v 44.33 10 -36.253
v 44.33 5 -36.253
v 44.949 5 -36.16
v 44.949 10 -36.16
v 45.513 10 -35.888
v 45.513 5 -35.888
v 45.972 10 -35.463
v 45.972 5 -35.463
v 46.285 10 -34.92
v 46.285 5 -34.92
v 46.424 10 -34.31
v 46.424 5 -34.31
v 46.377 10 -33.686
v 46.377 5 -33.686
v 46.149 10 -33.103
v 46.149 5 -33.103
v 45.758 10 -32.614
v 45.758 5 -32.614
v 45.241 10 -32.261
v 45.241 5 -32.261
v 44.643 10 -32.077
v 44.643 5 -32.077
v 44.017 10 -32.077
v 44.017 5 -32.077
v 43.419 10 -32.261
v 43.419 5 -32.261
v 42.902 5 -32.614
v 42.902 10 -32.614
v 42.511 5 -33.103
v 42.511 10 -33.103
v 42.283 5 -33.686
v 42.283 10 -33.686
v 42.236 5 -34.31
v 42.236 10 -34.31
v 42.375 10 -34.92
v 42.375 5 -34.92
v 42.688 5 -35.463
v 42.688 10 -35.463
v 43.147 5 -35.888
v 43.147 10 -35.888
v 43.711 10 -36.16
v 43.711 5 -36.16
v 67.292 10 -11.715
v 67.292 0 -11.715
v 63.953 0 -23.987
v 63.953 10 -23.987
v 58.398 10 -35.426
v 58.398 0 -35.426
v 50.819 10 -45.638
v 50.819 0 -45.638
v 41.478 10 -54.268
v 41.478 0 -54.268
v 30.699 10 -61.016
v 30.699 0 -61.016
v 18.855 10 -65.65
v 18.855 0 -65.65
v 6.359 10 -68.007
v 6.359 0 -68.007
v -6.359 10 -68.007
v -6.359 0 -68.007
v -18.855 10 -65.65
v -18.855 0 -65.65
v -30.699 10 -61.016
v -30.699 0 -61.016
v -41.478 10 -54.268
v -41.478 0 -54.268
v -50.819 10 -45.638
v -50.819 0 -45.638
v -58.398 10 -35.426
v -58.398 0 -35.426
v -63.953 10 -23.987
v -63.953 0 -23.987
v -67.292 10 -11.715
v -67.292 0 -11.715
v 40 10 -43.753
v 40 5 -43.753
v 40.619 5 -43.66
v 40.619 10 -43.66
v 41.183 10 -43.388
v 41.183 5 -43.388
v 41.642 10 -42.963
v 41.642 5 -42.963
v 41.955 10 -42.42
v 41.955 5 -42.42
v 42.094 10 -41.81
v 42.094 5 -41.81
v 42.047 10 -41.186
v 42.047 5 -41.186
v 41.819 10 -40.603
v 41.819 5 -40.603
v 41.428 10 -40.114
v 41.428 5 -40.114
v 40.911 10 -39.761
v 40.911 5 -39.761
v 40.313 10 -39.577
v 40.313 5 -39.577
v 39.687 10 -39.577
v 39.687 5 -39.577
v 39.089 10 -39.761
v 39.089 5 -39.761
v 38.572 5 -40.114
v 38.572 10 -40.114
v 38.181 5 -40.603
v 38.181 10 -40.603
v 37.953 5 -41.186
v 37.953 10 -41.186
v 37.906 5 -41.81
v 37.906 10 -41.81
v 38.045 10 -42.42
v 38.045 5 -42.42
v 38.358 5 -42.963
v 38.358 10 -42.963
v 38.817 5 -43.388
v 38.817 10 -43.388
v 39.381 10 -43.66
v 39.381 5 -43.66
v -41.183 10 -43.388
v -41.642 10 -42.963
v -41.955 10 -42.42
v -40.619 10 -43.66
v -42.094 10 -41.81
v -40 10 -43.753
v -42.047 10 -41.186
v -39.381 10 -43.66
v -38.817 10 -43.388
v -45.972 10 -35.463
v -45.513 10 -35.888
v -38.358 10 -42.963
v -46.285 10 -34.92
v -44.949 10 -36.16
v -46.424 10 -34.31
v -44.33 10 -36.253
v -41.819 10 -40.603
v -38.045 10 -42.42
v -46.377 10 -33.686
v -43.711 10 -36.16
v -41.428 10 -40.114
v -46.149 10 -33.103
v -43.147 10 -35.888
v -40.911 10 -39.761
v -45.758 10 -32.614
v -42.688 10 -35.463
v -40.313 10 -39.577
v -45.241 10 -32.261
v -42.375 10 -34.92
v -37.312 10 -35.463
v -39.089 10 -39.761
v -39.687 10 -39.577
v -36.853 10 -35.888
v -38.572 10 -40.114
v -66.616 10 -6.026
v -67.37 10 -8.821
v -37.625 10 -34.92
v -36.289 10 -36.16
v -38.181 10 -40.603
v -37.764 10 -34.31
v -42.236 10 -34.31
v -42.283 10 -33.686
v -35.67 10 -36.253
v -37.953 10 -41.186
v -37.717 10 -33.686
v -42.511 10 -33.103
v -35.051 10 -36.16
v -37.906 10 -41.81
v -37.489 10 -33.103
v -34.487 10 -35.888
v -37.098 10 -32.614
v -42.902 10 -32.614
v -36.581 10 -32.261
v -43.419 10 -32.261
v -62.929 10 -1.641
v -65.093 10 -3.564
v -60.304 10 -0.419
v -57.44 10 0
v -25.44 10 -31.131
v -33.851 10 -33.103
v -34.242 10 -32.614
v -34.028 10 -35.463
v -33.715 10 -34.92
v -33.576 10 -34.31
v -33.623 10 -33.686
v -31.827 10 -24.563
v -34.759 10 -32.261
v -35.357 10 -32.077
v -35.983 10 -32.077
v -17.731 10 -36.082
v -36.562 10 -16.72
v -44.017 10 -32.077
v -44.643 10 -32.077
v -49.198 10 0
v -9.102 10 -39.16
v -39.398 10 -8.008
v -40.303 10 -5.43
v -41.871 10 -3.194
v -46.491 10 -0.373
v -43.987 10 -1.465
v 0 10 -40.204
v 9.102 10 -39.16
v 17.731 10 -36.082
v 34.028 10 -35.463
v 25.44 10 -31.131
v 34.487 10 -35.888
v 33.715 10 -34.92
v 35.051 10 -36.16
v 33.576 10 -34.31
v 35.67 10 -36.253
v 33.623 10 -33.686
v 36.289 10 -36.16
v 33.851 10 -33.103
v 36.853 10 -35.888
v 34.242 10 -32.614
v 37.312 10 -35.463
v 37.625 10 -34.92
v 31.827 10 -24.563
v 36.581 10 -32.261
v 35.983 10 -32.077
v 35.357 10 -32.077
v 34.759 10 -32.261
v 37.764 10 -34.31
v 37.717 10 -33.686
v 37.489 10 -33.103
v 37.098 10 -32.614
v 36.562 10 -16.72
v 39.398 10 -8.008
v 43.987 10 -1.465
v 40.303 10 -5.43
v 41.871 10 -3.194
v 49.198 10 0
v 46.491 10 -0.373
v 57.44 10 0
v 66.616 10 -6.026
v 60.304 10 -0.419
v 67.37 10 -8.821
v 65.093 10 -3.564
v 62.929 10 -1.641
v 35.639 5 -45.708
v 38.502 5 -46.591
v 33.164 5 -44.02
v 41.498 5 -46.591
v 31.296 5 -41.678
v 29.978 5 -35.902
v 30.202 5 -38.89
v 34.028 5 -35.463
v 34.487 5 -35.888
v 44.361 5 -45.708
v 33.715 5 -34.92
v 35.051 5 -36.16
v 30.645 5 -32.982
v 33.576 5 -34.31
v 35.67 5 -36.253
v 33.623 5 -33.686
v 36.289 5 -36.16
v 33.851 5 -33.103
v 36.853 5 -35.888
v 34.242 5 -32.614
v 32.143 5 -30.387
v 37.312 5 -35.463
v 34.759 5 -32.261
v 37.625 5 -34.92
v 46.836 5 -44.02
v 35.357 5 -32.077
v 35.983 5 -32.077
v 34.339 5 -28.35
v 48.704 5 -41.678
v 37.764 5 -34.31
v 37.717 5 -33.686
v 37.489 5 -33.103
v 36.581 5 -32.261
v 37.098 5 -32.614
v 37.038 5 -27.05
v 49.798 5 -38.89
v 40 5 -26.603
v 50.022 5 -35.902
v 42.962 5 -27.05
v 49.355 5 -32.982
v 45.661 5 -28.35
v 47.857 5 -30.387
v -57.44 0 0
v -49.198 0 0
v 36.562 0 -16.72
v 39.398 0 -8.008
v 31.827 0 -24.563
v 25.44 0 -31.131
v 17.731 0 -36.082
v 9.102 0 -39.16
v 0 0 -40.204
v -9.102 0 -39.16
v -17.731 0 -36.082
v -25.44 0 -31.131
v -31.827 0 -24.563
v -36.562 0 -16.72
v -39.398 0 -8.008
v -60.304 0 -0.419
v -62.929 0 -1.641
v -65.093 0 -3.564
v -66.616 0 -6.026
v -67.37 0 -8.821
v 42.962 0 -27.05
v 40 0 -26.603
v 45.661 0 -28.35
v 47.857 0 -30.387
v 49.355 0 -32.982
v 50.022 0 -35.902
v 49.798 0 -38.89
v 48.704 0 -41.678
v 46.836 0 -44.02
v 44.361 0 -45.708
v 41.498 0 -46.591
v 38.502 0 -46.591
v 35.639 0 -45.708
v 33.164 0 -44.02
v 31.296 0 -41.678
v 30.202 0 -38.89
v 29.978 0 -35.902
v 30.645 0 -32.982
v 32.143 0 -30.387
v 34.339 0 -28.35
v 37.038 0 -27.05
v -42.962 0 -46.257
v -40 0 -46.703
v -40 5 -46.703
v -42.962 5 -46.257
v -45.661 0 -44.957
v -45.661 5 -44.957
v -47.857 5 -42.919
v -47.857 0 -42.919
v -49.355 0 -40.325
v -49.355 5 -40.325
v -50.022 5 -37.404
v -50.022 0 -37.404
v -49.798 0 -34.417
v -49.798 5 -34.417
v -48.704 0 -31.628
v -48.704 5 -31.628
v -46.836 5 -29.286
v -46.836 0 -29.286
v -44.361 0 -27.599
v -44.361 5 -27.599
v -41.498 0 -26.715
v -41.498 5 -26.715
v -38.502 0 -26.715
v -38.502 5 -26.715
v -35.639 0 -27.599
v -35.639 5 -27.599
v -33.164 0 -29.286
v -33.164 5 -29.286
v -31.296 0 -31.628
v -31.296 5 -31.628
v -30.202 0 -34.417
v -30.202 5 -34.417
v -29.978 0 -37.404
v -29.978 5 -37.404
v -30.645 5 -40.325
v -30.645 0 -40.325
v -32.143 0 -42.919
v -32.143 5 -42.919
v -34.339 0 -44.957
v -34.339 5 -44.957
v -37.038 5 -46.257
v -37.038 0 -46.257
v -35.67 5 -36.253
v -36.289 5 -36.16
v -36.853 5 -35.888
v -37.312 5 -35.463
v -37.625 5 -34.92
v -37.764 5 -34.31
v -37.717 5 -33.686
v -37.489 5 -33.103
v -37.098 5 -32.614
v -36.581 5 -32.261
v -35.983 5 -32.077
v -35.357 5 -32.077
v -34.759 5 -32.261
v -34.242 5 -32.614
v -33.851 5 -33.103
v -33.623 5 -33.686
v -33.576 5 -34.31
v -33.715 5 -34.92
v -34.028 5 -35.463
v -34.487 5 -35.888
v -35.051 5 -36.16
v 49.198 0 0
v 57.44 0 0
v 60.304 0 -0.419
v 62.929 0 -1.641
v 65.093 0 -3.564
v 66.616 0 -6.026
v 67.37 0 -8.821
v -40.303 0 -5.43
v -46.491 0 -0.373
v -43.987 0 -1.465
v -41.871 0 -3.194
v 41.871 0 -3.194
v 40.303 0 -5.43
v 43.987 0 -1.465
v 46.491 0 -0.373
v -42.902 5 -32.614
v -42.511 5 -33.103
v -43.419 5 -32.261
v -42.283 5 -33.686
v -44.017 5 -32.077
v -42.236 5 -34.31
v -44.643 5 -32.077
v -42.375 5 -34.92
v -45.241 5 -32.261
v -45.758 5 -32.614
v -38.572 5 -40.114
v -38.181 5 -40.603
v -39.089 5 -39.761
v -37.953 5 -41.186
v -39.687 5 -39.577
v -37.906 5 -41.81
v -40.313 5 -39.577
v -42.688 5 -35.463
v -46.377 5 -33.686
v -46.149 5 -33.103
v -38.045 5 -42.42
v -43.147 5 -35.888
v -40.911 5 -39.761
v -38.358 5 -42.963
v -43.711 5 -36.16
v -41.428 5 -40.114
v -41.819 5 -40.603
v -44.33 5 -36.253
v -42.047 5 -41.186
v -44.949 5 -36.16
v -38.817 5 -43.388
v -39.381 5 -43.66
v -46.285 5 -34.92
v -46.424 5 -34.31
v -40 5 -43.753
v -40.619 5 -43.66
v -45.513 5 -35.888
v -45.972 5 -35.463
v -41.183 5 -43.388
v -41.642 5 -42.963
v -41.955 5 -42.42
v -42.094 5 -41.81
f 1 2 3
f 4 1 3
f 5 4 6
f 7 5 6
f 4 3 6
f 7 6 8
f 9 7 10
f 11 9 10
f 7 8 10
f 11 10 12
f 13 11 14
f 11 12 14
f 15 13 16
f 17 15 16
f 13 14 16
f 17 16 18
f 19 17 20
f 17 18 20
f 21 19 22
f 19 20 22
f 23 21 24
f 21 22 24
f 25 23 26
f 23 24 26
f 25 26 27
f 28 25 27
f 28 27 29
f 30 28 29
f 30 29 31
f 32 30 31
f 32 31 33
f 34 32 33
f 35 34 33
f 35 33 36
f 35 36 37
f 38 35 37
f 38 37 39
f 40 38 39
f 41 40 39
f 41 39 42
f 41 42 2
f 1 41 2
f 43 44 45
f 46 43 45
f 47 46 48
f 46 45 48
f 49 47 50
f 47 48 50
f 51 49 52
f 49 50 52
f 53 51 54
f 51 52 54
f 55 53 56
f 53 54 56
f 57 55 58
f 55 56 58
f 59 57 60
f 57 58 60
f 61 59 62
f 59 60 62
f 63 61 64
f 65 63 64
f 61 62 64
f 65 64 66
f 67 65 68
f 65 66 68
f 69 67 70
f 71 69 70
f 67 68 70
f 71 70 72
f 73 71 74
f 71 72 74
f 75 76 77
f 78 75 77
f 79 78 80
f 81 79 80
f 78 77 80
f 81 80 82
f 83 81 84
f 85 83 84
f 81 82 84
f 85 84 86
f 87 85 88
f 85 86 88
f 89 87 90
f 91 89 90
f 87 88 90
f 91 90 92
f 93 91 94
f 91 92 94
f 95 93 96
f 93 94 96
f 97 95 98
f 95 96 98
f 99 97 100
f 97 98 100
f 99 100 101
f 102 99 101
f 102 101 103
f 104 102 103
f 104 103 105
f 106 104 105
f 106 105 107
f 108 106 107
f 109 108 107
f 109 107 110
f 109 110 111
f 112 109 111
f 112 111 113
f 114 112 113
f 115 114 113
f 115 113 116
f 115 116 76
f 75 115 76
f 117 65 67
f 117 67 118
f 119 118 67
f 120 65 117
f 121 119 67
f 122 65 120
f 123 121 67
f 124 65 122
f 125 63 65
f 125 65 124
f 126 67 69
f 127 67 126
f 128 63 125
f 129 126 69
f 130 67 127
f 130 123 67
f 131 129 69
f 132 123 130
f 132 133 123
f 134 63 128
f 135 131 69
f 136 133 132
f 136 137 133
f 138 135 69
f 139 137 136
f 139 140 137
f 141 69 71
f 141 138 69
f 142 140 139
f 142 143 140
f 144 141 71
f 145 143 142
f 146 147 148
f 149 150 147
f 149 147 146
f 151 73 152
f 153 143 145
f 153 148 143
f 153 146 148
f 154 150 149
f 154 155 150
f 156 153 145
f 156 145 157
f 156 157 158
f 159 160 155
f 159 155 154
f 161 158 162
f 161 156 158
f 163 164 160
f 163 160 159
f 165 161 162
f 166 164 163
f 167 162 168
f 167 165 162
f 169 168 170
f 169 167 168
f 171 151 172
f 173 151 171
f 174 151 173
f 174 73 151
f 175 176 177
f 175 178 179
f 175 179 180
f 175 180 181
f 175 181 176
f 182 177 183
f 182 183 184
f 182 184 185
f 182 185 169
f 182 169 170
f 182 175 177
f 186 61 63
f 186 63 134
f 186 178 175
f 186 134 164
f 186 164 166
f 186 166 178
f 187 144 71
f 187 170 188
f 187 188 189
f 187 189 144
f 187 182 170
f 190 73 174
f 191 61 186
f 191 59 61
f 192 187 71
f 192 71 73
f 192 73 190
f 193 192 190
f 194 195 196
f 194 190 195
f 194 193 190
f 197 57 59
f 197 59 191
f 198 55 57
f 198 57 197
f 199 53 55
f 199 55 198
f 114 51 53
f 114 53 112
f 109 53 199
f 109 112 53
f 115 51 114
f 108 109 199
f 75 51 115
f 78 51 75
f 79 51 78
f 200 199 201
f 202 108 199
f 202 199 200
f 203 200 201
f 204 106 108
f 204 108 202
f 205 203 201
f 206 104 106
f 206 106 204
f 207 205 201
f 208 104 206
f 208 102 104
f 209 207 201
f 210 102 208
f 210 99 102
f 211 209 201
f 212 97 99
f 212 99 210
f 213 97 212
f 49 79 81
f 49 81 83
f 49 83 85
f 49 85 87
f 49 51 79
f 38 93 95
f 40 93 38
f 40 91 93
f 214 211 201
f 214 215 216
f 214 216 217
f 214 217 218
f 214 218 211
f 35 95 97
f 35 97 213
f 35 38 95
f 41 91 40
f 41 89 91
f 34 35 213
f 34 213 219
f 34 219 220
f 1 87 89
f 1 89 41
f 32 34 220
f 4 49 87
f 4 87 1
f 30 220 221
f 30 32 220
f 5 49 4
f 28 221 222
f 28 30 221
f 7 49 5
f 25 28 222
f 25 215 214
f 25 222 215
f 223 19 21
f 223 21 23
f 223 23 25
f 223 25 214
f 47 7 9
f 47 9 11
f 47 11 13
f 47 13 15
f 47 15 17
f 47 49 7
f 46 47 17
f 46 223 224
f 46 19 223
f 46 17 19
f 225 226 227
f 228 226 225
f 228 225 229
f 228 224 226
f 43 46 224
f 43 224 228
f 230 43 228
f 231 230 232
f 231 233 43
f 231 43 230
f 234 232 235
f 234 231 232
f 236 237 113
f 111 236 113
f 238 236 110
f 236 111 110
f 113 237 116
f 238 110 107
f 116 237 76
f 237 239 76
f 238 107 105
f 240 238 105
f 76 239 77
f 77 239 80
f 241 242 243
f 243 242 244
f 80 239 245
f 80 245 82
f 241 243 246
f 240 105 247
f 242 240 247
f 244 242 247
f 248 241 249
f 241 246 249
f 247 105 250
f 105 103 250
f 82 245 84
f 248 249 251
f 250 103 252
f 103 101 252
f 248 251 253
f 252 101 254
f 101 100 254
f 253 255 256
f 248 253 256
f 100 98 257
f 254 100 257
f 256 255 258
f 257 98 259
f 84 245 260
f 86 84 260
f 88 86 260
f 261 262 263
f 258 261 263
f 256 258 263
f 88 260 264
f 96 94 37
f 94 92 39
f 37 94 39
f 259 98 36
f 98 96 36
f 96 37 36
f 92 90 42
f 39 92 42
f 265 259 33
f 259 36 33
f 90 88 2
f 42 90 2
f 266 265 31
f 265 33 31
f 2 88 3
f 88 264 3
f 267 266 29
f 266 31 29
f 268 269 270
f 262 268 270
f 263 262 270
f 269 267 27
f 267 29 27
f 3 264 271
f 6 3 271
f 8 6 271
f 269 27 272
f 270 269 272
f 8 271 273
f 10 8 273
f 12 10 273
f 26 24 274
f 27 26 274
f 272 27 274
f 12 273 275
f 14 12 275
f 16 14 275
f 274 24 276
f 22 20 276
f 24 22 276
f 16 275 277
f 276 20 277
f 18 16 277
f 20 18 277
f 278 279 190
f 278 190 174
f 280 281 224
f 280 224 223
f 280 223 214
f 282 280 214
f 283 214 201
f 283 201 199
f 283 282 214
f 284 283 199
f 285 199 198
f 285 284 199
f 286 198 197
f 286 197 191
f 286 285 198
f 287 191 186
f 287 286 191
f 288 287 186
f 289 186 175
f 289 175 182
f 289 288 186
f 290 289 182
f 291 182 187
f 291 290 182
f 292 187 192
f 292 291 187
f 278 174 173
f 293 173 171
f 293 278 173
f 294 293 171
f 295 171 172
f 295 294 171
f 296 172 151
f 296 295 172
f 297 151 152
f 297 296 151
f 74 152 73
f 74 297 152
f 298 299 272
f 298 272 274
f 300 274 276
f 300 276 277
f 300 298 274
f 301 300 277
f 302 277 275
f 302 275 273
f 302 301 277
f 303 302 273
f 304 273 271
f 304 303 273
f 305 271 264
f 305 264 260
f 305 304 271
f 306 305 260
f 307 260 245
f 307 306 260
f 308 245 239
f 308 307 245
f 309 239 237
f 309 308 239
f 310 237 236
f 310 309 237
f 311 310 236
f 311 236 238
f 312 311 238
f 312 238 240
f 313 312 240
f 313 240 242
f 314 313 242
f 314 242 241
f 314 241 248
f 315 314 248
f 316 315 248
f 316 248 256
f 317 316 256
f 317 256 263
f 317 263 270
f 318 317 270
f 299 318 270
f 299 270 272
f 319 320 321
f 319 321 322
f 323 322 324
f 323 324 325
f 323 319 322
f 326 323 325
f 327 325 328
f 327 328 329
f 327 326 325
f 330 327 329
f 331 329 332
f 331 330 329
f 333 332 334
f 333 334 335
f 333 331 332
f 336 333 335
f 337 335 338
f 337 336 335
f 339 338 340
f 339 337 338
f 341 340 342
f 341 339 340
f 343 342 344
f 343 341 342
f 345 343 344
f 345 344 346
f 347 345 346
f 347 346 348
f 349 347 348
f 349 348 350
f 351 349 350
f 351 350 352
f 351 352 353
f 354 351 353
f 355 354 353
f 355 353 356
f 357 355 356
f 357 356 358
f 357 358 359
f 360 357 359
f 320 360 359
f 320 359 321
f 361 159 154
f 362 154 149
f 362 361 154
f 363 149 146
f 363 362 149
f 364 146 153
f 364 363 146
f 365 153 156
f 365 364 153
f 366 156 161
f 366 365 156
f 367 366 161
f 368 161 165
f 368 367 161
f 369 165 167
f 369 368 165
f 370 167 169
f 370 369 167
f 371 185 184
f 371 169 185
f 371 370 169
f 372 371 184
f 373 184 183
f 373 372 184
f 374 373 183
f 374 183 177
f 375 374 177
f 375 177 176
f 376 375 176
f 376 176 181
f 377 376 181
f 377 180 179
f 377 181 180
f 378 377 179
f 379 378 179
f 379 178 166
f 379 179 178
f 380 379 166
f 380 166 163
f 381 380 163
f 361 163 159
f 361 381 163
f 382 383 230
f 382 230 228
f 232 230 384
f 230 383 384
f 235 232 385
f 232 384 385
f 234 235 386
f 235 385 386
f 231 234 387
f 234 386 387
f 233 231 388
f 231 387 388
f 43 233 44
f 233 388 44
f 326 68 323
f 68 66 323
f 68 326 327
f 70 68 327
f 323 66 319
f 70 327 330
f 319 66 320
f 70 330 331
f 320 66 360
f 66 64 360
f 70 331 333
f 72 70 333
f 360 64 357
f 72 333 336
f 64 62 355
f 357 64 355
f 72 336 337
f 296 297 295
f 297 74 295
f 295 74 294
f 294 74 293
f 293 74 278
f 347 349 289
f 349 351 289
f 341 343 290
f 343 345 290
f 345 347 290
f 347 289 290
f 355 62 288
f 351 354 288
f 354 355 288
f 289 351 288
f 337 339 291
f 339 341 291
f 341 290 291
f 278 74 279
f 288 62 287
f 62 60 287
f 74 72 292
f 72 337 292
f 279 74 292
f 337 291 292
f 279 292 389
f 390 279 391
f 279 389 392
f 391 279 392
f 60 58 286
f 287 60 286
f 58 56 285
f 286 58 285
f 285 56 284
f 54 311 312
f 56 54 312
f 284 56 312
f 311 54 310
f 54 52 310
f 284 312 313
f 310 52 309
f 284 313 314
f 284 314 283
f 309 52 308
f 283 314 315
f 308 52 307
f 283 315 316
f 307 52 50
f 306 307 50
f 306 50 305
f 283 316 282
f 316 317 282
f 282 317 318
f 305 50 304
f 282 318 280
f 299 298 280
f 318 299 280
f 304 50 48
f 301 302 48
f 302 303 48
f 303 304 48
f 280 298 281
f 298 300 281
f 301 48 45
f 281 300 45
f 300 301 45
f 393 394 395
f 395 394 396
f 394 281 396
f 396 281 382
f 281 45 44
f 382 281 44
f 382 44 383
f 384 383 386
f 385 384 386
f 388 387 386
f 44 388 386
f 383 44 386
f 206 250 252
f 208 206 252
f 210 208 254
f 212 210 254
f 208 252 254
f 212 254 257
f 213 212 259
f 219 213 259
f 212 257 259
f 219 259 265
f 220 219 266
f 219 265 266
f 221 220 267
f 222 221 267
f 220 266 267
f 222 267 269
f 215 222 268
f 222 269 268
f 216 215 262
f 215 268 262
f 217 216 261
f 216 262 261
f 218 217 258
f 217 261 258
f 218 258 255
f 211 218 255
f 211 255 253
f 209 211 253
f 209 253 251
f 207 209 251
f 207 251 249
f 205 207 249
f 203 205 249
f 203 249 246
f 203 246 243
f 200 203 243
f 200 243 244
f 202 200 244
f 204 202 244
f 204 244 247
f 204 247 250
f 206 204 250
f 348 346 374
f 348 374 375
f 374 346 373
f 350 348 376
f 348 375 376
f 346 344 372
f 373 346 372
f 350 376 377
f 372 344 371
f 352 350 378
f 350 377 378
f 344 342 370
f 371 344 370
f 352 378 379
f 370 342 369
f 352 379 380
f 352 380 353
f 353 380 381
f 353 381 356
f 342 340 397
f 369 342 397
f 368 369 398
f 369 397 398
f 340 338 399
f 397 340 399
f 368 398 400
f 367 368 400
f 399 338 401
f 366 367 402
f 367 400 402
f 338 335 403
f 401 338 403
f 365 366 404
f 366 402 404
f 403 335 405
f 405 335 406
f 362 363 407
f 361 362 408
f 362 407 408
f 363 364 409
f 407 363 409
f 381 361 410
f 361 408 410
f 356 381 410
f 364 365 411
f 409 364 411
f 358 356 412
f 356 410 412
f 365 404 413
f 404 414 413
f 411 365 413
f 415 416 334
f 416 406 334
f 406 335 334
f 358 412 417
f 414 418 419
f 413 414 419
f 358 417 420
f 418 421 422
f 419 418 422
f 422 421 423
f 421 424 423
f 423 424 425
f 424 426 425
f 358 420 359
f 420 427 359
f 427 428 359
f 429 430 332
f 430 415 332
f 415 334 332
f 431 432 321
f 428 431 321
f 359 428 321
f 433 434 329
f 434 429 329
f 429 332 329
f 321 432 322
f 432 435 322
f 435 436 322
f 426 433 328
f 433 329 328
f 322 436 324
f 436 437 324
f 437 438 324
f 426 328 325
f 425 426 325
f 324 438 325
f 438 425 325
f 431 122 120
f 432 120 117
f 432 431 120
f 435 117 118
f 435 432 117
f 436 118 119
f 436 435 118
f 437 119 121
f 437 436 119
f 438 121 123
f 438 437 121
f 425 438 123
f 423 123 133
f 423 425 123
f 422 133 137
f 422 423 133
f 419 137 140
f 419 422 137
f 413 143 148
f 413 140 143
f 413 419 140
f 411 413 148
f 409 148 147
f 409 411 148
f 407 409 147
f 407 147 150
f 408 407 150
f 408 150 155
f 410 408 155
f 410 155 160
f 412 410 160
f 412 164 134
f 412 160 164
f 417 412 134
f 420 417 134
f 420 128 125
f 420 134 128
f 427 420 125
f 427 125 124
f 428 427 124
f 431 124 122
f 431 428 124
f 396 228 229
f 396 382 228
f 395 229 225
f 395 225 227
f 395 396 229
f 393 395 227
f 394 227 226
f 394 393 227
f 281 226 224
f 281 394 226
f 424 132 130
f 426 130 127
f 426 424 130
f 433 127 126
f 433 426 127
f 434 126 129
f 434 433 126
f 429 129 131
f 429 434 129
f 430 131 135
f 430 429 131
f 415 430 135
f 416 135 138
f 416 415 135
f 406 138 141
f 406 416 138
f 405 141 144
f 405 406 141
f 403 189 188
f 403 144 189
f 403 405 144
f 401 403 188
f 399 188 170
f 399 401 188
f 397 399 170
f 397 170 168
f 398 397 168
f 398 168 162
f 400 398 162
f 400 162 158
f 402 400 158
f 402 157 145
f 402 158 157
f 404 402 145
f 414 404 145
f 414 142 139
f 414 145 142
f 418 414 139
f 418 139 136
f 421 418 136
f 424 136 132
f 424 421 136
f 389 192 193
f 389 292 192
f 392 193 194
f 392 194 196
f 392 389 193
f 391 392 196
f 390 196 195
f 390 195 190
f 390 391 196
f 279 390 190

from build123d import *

# Parameters (mm, degrees)
SKETCH_2_R          = 68.303668196
SKETCH_2_R_2        = 10.05
SKETCH_2_R_3        = 40.203668196
EXTRUDE_1_DEPTH     = 10
EXTRUDE_START       = -5
SKETCH_3_R          = 10.05
EXTRUDE_2_DEPTH     = 5
SKETCH_4_W          = 280.2912044
SKETCH_4_H          = 106.849461173
CUT_EXTRUDE_2_DEPTH = 45
SKETCH_5_R          = 2.1
CUT_EXTRUDE_3_DEPTH = 45
FILLET_1_R          = 10


with BuildPart() as part:
    # 草图2 → 凸台-拉伸1 (new body)
    with BuildSketch(Plane(origin=(0, 0, 0), x_dir=(1, 0, 0), z_dir=(0, 1, 0))):
        with Locations(Location((0, 0, 0), (0, 0, 270))):
            Circle(SKETCH_2_R)
        with Locations(Location((40, 36.653246961, 0), (0, 0, 270))):
            Circle(SKETCH_2_R_2, mode=Mode.SUBTRACT)
        with Locations(Location((0, 0, 0), (0, 0, 270))):
            Circle(SKETCH_2_R_3, mode=Mode.SUBTRACT)
        with Locations(Location((-40, 36.653246961, 0), (0, 0, 90))):
            Circle(SKETCH_2_R_2, mode=Mode.SUBTRACT)
    extrude(amount=EXTRUDE_1_DEPTH)

    # 草图3 → 凸台-拉伸2 (add)
    with BuildSketch(Plane(origin=(0, 10, 0), x_dir=(1, 0, 0), z_dir=(0, 1, 0)).offset(EXTRUDE_START)):
        with Locations(Location((-40, 36.653246961, 0), (0, 0, 90))):
            Circle(SKETCH_3_R)
        with Locations(Location((40, 36.653246961, 0), (0, 0, 270))):
            Circle(SKETCH_3_R)
    extrude(amount=EXTRUDE_2_DEPTH)

    # 草图4 → 切除-拉伸2 (cut)
    with BuildSketch(Plane(origin=(0, 0, 0), x_dir=(-1, 0, 0), z_dir=(0, -1, 0))):
        with Locations((7.276792676, -53.424730587)):
            Rectangle(SKETCH_4_W, SKETCH_4_H)
    extrude(amount=-CUT_EXTRUDE_2_DEPTH, mode=Mode.SUBTRACT)

    # 草图5 → 切除-拉伸3 (cut)
    with BuildSketch(Plane(origin=(0, 5, 0), x_dir=(-1, 0, 0), z_dir=(0, -1, 0))):
        with Locations(Location((-40, 41.653246961, 0), (0, 0, 90))):
            Circle(SKETCH_5_R)
        with Locations(Location((-35.669872981, 34.153246961, 0), (0, 0, 90))):
            Circle(SKETCH_5_R)
        with Locations(Location((-44.330127019, 34.153246961, 0), (0, 0, 90))):
            Circle(SKETCH_5_R)
    cut_extrude_3 = extrude(amount=-CUT_EXTRUDE_3_DEPTH, mode=Mode.SUBTRACT)

    # 镜向1: 切除-拉伸3 across plane
    add(cut_extrude_3.mirror(Plane(origin=(0, 0, 0), x_dir=(0, 0, 1), z_dir=(1, 0, 0))), mode=Mode.SUBTRACT)

    # 圆角1
    fillet_1_edges = [part.edges().sort_by_distance(p)[0] for p in [
        (-40.203668196, 5, 0),
        (40.203668196, 5, 0),
        (68.303668196, 5, 0),
        (-68.303668196, 5, 0),
    ]]
    fillet(fillet_1_edges, radius=FILLET_1_R)


solid = part.part
